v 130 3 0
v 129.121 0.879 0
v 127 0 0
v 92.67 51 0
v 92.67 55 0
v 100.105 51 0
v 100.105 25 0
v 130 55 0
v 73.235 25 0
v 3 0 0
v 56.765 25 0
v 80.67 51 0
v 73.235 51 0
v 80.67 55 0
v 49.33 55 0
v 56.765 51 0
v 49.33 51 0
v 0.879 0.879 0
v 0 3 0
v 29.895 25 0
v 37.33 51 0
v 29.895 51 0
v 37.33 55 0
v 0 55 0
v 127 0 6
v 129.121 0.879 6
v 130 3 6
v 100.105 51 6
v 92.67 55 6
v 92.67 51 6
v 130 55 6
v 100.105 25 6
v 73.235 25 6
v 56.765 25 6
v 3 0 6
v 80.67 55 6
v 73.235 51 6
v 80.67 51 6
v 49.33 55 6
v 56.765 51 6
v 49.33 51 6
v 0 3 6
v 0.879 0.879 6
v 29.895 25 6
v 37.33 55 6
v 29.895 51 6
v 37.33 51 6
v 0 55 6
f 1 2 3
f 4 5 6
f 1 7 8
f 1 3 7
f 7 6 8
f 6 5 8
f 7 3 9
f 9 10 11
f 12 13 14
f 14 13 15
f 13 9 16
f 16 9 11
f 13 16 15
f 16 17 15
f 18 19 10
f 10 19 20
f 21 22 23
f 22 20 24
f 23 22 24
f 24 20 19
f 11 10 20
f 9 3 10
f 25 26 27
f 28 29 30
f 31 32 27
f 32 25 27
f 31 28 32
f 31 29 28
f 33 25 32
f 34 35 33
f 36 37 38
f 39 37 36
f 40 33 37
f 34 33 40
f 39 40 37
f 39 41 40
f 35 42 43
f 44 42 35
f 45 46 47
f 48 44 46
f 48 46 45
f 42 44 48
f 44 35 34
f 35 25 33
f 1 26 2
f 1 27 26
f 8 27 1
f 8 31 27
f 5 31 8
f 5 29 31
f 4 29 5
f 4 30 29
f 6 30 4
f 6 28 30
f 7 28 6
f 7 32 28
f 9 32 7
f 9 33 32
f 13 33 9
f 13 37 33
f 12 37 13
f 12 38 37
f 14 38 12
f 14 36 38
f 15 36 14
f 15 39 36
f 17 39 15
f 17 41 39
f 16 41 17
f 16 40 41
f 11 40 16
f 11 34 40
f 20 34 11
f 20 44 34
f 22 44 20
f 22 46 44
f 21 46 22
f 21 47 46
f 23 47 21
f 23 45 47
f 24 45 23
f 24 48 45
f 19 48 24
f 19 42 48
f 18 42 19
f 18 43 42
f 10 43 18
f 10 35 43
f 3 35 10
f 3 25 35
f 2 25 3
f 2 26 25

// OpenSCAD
$fn = 32;

// ----------------------------------------------------------------------
// Window plate: 130 x 55 mm, 2 open windows
// ----------------------------------------------------------------------

// --- parameters (mm) ---
profile_height = 6;       // extrusion height
profile_points = 24;      // points of the closed outline

profile = [[0, 3], [0.879, 0.879], [3, 0], [127, 0], [129.121, 0.879], [130, 3], [130, 55], [92.67, 55], [92.67, 51], [100.105, 51], [100.105, 25], [73.235, 25], [73.235, 51], [80.67, 51], [80.67, 55], [49.33, 55], [49.33, 51], [56.765, 51], [56.765, 25], [29.895, 25], [29.895, 51], [37.33, 51], [37.33, 55], [0, 55]];  // single closed polygon, 24 points, counter clockwise

// --- the one profile operation ---
linear_extrude(height = profile_height) polygon(points = profile);
